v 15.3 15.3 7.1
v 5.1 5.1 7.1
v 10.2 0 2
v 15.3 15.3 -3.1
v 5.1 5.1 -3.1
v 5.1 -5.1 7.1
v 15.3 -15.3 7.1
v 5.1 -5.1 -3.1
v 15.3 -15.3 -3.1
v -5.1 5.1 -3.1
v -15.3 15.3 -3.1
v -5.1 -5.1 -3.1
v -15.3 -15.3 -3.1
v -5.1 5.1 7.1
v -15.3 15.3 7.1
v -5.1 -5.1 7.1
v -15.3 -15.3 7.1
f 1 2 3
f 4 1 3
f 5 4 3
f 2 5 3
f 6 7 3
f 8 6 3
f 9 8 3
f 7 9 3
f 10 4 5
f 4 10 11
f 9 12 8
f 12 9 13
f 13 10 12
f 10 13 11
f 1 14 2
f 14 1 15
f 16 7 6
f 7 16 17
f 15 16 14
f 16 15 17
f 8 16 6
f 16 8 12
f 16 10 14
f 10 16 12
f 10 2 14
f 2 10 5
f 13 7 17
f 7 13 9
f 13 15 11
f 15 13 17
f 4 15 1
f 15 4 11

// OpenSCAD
translate([0, 0, 2])
scale(1.02)
translate([-15,-15,-5]) {
    scale(10) {
        polyhedron(
            //         1------------------0
            //        /|                 /|
            //       / |    9----8      / |
            //      /  5-- /|   /| ----/--4
            //     /  /  11----10|    /  /
            //    /  /    |13--|-12  /  /
            //   3------  |/   |/ --2  /
            //   | /     15----14   | /
            //   |/                 |/
            //   7------------------6
            points=[
                [3,3,1],
                [0,3,1],
                [3,0,1],
                [0,0,1],
                [3,3,0],
                [0,3,0],
                [3,0,0],
                [0,0,0],

                [2,2,1],
                [1,2,1],
                [2,1,1],
                [1,1,1],
                [2,2,0],
                [1,2,0],
                [2,1,0],
                [1,1,0],

                [2.5,1.5,0.5],
            ],
            faces=[
                [ 16, 8, 0 ],
                [ 16, 0, 4 ],
                [ 16, 4, 12 ],
                [ 16, 12, 8 ],

                [ 16, 2, 10 ],
                [ 16,10, 14 ],
                [ 16,14, 6 ],
                [ 16, 6, 2 ],

                [  4,  5, 13, 12 ],
             // [  4, 12, 14,  6 ],
                [  6, 14, 15,  7 ],
                [  7, 15, 13,  5 ],

                [  1,  0,  8,  9 ],
             // [  0,  2, 10,  8 ],
                [  2,  3, 11, 10 ],
                [  3,  1,  9, 11 ],

             // [  8, 10, 14, 12 ],
                [ 10, 11, 15, 14 ],
                [ 11,  9, 13, 15 ],
                [  9,  8, 12, 13 ],

             // [  0,  4,  6,  2 ],
                [  2,  6,  7,  3 ],
                [  3,  7,  5,  1 ],
                [  1,  5,  4,  0 ],
            ]
        );
    };
}
